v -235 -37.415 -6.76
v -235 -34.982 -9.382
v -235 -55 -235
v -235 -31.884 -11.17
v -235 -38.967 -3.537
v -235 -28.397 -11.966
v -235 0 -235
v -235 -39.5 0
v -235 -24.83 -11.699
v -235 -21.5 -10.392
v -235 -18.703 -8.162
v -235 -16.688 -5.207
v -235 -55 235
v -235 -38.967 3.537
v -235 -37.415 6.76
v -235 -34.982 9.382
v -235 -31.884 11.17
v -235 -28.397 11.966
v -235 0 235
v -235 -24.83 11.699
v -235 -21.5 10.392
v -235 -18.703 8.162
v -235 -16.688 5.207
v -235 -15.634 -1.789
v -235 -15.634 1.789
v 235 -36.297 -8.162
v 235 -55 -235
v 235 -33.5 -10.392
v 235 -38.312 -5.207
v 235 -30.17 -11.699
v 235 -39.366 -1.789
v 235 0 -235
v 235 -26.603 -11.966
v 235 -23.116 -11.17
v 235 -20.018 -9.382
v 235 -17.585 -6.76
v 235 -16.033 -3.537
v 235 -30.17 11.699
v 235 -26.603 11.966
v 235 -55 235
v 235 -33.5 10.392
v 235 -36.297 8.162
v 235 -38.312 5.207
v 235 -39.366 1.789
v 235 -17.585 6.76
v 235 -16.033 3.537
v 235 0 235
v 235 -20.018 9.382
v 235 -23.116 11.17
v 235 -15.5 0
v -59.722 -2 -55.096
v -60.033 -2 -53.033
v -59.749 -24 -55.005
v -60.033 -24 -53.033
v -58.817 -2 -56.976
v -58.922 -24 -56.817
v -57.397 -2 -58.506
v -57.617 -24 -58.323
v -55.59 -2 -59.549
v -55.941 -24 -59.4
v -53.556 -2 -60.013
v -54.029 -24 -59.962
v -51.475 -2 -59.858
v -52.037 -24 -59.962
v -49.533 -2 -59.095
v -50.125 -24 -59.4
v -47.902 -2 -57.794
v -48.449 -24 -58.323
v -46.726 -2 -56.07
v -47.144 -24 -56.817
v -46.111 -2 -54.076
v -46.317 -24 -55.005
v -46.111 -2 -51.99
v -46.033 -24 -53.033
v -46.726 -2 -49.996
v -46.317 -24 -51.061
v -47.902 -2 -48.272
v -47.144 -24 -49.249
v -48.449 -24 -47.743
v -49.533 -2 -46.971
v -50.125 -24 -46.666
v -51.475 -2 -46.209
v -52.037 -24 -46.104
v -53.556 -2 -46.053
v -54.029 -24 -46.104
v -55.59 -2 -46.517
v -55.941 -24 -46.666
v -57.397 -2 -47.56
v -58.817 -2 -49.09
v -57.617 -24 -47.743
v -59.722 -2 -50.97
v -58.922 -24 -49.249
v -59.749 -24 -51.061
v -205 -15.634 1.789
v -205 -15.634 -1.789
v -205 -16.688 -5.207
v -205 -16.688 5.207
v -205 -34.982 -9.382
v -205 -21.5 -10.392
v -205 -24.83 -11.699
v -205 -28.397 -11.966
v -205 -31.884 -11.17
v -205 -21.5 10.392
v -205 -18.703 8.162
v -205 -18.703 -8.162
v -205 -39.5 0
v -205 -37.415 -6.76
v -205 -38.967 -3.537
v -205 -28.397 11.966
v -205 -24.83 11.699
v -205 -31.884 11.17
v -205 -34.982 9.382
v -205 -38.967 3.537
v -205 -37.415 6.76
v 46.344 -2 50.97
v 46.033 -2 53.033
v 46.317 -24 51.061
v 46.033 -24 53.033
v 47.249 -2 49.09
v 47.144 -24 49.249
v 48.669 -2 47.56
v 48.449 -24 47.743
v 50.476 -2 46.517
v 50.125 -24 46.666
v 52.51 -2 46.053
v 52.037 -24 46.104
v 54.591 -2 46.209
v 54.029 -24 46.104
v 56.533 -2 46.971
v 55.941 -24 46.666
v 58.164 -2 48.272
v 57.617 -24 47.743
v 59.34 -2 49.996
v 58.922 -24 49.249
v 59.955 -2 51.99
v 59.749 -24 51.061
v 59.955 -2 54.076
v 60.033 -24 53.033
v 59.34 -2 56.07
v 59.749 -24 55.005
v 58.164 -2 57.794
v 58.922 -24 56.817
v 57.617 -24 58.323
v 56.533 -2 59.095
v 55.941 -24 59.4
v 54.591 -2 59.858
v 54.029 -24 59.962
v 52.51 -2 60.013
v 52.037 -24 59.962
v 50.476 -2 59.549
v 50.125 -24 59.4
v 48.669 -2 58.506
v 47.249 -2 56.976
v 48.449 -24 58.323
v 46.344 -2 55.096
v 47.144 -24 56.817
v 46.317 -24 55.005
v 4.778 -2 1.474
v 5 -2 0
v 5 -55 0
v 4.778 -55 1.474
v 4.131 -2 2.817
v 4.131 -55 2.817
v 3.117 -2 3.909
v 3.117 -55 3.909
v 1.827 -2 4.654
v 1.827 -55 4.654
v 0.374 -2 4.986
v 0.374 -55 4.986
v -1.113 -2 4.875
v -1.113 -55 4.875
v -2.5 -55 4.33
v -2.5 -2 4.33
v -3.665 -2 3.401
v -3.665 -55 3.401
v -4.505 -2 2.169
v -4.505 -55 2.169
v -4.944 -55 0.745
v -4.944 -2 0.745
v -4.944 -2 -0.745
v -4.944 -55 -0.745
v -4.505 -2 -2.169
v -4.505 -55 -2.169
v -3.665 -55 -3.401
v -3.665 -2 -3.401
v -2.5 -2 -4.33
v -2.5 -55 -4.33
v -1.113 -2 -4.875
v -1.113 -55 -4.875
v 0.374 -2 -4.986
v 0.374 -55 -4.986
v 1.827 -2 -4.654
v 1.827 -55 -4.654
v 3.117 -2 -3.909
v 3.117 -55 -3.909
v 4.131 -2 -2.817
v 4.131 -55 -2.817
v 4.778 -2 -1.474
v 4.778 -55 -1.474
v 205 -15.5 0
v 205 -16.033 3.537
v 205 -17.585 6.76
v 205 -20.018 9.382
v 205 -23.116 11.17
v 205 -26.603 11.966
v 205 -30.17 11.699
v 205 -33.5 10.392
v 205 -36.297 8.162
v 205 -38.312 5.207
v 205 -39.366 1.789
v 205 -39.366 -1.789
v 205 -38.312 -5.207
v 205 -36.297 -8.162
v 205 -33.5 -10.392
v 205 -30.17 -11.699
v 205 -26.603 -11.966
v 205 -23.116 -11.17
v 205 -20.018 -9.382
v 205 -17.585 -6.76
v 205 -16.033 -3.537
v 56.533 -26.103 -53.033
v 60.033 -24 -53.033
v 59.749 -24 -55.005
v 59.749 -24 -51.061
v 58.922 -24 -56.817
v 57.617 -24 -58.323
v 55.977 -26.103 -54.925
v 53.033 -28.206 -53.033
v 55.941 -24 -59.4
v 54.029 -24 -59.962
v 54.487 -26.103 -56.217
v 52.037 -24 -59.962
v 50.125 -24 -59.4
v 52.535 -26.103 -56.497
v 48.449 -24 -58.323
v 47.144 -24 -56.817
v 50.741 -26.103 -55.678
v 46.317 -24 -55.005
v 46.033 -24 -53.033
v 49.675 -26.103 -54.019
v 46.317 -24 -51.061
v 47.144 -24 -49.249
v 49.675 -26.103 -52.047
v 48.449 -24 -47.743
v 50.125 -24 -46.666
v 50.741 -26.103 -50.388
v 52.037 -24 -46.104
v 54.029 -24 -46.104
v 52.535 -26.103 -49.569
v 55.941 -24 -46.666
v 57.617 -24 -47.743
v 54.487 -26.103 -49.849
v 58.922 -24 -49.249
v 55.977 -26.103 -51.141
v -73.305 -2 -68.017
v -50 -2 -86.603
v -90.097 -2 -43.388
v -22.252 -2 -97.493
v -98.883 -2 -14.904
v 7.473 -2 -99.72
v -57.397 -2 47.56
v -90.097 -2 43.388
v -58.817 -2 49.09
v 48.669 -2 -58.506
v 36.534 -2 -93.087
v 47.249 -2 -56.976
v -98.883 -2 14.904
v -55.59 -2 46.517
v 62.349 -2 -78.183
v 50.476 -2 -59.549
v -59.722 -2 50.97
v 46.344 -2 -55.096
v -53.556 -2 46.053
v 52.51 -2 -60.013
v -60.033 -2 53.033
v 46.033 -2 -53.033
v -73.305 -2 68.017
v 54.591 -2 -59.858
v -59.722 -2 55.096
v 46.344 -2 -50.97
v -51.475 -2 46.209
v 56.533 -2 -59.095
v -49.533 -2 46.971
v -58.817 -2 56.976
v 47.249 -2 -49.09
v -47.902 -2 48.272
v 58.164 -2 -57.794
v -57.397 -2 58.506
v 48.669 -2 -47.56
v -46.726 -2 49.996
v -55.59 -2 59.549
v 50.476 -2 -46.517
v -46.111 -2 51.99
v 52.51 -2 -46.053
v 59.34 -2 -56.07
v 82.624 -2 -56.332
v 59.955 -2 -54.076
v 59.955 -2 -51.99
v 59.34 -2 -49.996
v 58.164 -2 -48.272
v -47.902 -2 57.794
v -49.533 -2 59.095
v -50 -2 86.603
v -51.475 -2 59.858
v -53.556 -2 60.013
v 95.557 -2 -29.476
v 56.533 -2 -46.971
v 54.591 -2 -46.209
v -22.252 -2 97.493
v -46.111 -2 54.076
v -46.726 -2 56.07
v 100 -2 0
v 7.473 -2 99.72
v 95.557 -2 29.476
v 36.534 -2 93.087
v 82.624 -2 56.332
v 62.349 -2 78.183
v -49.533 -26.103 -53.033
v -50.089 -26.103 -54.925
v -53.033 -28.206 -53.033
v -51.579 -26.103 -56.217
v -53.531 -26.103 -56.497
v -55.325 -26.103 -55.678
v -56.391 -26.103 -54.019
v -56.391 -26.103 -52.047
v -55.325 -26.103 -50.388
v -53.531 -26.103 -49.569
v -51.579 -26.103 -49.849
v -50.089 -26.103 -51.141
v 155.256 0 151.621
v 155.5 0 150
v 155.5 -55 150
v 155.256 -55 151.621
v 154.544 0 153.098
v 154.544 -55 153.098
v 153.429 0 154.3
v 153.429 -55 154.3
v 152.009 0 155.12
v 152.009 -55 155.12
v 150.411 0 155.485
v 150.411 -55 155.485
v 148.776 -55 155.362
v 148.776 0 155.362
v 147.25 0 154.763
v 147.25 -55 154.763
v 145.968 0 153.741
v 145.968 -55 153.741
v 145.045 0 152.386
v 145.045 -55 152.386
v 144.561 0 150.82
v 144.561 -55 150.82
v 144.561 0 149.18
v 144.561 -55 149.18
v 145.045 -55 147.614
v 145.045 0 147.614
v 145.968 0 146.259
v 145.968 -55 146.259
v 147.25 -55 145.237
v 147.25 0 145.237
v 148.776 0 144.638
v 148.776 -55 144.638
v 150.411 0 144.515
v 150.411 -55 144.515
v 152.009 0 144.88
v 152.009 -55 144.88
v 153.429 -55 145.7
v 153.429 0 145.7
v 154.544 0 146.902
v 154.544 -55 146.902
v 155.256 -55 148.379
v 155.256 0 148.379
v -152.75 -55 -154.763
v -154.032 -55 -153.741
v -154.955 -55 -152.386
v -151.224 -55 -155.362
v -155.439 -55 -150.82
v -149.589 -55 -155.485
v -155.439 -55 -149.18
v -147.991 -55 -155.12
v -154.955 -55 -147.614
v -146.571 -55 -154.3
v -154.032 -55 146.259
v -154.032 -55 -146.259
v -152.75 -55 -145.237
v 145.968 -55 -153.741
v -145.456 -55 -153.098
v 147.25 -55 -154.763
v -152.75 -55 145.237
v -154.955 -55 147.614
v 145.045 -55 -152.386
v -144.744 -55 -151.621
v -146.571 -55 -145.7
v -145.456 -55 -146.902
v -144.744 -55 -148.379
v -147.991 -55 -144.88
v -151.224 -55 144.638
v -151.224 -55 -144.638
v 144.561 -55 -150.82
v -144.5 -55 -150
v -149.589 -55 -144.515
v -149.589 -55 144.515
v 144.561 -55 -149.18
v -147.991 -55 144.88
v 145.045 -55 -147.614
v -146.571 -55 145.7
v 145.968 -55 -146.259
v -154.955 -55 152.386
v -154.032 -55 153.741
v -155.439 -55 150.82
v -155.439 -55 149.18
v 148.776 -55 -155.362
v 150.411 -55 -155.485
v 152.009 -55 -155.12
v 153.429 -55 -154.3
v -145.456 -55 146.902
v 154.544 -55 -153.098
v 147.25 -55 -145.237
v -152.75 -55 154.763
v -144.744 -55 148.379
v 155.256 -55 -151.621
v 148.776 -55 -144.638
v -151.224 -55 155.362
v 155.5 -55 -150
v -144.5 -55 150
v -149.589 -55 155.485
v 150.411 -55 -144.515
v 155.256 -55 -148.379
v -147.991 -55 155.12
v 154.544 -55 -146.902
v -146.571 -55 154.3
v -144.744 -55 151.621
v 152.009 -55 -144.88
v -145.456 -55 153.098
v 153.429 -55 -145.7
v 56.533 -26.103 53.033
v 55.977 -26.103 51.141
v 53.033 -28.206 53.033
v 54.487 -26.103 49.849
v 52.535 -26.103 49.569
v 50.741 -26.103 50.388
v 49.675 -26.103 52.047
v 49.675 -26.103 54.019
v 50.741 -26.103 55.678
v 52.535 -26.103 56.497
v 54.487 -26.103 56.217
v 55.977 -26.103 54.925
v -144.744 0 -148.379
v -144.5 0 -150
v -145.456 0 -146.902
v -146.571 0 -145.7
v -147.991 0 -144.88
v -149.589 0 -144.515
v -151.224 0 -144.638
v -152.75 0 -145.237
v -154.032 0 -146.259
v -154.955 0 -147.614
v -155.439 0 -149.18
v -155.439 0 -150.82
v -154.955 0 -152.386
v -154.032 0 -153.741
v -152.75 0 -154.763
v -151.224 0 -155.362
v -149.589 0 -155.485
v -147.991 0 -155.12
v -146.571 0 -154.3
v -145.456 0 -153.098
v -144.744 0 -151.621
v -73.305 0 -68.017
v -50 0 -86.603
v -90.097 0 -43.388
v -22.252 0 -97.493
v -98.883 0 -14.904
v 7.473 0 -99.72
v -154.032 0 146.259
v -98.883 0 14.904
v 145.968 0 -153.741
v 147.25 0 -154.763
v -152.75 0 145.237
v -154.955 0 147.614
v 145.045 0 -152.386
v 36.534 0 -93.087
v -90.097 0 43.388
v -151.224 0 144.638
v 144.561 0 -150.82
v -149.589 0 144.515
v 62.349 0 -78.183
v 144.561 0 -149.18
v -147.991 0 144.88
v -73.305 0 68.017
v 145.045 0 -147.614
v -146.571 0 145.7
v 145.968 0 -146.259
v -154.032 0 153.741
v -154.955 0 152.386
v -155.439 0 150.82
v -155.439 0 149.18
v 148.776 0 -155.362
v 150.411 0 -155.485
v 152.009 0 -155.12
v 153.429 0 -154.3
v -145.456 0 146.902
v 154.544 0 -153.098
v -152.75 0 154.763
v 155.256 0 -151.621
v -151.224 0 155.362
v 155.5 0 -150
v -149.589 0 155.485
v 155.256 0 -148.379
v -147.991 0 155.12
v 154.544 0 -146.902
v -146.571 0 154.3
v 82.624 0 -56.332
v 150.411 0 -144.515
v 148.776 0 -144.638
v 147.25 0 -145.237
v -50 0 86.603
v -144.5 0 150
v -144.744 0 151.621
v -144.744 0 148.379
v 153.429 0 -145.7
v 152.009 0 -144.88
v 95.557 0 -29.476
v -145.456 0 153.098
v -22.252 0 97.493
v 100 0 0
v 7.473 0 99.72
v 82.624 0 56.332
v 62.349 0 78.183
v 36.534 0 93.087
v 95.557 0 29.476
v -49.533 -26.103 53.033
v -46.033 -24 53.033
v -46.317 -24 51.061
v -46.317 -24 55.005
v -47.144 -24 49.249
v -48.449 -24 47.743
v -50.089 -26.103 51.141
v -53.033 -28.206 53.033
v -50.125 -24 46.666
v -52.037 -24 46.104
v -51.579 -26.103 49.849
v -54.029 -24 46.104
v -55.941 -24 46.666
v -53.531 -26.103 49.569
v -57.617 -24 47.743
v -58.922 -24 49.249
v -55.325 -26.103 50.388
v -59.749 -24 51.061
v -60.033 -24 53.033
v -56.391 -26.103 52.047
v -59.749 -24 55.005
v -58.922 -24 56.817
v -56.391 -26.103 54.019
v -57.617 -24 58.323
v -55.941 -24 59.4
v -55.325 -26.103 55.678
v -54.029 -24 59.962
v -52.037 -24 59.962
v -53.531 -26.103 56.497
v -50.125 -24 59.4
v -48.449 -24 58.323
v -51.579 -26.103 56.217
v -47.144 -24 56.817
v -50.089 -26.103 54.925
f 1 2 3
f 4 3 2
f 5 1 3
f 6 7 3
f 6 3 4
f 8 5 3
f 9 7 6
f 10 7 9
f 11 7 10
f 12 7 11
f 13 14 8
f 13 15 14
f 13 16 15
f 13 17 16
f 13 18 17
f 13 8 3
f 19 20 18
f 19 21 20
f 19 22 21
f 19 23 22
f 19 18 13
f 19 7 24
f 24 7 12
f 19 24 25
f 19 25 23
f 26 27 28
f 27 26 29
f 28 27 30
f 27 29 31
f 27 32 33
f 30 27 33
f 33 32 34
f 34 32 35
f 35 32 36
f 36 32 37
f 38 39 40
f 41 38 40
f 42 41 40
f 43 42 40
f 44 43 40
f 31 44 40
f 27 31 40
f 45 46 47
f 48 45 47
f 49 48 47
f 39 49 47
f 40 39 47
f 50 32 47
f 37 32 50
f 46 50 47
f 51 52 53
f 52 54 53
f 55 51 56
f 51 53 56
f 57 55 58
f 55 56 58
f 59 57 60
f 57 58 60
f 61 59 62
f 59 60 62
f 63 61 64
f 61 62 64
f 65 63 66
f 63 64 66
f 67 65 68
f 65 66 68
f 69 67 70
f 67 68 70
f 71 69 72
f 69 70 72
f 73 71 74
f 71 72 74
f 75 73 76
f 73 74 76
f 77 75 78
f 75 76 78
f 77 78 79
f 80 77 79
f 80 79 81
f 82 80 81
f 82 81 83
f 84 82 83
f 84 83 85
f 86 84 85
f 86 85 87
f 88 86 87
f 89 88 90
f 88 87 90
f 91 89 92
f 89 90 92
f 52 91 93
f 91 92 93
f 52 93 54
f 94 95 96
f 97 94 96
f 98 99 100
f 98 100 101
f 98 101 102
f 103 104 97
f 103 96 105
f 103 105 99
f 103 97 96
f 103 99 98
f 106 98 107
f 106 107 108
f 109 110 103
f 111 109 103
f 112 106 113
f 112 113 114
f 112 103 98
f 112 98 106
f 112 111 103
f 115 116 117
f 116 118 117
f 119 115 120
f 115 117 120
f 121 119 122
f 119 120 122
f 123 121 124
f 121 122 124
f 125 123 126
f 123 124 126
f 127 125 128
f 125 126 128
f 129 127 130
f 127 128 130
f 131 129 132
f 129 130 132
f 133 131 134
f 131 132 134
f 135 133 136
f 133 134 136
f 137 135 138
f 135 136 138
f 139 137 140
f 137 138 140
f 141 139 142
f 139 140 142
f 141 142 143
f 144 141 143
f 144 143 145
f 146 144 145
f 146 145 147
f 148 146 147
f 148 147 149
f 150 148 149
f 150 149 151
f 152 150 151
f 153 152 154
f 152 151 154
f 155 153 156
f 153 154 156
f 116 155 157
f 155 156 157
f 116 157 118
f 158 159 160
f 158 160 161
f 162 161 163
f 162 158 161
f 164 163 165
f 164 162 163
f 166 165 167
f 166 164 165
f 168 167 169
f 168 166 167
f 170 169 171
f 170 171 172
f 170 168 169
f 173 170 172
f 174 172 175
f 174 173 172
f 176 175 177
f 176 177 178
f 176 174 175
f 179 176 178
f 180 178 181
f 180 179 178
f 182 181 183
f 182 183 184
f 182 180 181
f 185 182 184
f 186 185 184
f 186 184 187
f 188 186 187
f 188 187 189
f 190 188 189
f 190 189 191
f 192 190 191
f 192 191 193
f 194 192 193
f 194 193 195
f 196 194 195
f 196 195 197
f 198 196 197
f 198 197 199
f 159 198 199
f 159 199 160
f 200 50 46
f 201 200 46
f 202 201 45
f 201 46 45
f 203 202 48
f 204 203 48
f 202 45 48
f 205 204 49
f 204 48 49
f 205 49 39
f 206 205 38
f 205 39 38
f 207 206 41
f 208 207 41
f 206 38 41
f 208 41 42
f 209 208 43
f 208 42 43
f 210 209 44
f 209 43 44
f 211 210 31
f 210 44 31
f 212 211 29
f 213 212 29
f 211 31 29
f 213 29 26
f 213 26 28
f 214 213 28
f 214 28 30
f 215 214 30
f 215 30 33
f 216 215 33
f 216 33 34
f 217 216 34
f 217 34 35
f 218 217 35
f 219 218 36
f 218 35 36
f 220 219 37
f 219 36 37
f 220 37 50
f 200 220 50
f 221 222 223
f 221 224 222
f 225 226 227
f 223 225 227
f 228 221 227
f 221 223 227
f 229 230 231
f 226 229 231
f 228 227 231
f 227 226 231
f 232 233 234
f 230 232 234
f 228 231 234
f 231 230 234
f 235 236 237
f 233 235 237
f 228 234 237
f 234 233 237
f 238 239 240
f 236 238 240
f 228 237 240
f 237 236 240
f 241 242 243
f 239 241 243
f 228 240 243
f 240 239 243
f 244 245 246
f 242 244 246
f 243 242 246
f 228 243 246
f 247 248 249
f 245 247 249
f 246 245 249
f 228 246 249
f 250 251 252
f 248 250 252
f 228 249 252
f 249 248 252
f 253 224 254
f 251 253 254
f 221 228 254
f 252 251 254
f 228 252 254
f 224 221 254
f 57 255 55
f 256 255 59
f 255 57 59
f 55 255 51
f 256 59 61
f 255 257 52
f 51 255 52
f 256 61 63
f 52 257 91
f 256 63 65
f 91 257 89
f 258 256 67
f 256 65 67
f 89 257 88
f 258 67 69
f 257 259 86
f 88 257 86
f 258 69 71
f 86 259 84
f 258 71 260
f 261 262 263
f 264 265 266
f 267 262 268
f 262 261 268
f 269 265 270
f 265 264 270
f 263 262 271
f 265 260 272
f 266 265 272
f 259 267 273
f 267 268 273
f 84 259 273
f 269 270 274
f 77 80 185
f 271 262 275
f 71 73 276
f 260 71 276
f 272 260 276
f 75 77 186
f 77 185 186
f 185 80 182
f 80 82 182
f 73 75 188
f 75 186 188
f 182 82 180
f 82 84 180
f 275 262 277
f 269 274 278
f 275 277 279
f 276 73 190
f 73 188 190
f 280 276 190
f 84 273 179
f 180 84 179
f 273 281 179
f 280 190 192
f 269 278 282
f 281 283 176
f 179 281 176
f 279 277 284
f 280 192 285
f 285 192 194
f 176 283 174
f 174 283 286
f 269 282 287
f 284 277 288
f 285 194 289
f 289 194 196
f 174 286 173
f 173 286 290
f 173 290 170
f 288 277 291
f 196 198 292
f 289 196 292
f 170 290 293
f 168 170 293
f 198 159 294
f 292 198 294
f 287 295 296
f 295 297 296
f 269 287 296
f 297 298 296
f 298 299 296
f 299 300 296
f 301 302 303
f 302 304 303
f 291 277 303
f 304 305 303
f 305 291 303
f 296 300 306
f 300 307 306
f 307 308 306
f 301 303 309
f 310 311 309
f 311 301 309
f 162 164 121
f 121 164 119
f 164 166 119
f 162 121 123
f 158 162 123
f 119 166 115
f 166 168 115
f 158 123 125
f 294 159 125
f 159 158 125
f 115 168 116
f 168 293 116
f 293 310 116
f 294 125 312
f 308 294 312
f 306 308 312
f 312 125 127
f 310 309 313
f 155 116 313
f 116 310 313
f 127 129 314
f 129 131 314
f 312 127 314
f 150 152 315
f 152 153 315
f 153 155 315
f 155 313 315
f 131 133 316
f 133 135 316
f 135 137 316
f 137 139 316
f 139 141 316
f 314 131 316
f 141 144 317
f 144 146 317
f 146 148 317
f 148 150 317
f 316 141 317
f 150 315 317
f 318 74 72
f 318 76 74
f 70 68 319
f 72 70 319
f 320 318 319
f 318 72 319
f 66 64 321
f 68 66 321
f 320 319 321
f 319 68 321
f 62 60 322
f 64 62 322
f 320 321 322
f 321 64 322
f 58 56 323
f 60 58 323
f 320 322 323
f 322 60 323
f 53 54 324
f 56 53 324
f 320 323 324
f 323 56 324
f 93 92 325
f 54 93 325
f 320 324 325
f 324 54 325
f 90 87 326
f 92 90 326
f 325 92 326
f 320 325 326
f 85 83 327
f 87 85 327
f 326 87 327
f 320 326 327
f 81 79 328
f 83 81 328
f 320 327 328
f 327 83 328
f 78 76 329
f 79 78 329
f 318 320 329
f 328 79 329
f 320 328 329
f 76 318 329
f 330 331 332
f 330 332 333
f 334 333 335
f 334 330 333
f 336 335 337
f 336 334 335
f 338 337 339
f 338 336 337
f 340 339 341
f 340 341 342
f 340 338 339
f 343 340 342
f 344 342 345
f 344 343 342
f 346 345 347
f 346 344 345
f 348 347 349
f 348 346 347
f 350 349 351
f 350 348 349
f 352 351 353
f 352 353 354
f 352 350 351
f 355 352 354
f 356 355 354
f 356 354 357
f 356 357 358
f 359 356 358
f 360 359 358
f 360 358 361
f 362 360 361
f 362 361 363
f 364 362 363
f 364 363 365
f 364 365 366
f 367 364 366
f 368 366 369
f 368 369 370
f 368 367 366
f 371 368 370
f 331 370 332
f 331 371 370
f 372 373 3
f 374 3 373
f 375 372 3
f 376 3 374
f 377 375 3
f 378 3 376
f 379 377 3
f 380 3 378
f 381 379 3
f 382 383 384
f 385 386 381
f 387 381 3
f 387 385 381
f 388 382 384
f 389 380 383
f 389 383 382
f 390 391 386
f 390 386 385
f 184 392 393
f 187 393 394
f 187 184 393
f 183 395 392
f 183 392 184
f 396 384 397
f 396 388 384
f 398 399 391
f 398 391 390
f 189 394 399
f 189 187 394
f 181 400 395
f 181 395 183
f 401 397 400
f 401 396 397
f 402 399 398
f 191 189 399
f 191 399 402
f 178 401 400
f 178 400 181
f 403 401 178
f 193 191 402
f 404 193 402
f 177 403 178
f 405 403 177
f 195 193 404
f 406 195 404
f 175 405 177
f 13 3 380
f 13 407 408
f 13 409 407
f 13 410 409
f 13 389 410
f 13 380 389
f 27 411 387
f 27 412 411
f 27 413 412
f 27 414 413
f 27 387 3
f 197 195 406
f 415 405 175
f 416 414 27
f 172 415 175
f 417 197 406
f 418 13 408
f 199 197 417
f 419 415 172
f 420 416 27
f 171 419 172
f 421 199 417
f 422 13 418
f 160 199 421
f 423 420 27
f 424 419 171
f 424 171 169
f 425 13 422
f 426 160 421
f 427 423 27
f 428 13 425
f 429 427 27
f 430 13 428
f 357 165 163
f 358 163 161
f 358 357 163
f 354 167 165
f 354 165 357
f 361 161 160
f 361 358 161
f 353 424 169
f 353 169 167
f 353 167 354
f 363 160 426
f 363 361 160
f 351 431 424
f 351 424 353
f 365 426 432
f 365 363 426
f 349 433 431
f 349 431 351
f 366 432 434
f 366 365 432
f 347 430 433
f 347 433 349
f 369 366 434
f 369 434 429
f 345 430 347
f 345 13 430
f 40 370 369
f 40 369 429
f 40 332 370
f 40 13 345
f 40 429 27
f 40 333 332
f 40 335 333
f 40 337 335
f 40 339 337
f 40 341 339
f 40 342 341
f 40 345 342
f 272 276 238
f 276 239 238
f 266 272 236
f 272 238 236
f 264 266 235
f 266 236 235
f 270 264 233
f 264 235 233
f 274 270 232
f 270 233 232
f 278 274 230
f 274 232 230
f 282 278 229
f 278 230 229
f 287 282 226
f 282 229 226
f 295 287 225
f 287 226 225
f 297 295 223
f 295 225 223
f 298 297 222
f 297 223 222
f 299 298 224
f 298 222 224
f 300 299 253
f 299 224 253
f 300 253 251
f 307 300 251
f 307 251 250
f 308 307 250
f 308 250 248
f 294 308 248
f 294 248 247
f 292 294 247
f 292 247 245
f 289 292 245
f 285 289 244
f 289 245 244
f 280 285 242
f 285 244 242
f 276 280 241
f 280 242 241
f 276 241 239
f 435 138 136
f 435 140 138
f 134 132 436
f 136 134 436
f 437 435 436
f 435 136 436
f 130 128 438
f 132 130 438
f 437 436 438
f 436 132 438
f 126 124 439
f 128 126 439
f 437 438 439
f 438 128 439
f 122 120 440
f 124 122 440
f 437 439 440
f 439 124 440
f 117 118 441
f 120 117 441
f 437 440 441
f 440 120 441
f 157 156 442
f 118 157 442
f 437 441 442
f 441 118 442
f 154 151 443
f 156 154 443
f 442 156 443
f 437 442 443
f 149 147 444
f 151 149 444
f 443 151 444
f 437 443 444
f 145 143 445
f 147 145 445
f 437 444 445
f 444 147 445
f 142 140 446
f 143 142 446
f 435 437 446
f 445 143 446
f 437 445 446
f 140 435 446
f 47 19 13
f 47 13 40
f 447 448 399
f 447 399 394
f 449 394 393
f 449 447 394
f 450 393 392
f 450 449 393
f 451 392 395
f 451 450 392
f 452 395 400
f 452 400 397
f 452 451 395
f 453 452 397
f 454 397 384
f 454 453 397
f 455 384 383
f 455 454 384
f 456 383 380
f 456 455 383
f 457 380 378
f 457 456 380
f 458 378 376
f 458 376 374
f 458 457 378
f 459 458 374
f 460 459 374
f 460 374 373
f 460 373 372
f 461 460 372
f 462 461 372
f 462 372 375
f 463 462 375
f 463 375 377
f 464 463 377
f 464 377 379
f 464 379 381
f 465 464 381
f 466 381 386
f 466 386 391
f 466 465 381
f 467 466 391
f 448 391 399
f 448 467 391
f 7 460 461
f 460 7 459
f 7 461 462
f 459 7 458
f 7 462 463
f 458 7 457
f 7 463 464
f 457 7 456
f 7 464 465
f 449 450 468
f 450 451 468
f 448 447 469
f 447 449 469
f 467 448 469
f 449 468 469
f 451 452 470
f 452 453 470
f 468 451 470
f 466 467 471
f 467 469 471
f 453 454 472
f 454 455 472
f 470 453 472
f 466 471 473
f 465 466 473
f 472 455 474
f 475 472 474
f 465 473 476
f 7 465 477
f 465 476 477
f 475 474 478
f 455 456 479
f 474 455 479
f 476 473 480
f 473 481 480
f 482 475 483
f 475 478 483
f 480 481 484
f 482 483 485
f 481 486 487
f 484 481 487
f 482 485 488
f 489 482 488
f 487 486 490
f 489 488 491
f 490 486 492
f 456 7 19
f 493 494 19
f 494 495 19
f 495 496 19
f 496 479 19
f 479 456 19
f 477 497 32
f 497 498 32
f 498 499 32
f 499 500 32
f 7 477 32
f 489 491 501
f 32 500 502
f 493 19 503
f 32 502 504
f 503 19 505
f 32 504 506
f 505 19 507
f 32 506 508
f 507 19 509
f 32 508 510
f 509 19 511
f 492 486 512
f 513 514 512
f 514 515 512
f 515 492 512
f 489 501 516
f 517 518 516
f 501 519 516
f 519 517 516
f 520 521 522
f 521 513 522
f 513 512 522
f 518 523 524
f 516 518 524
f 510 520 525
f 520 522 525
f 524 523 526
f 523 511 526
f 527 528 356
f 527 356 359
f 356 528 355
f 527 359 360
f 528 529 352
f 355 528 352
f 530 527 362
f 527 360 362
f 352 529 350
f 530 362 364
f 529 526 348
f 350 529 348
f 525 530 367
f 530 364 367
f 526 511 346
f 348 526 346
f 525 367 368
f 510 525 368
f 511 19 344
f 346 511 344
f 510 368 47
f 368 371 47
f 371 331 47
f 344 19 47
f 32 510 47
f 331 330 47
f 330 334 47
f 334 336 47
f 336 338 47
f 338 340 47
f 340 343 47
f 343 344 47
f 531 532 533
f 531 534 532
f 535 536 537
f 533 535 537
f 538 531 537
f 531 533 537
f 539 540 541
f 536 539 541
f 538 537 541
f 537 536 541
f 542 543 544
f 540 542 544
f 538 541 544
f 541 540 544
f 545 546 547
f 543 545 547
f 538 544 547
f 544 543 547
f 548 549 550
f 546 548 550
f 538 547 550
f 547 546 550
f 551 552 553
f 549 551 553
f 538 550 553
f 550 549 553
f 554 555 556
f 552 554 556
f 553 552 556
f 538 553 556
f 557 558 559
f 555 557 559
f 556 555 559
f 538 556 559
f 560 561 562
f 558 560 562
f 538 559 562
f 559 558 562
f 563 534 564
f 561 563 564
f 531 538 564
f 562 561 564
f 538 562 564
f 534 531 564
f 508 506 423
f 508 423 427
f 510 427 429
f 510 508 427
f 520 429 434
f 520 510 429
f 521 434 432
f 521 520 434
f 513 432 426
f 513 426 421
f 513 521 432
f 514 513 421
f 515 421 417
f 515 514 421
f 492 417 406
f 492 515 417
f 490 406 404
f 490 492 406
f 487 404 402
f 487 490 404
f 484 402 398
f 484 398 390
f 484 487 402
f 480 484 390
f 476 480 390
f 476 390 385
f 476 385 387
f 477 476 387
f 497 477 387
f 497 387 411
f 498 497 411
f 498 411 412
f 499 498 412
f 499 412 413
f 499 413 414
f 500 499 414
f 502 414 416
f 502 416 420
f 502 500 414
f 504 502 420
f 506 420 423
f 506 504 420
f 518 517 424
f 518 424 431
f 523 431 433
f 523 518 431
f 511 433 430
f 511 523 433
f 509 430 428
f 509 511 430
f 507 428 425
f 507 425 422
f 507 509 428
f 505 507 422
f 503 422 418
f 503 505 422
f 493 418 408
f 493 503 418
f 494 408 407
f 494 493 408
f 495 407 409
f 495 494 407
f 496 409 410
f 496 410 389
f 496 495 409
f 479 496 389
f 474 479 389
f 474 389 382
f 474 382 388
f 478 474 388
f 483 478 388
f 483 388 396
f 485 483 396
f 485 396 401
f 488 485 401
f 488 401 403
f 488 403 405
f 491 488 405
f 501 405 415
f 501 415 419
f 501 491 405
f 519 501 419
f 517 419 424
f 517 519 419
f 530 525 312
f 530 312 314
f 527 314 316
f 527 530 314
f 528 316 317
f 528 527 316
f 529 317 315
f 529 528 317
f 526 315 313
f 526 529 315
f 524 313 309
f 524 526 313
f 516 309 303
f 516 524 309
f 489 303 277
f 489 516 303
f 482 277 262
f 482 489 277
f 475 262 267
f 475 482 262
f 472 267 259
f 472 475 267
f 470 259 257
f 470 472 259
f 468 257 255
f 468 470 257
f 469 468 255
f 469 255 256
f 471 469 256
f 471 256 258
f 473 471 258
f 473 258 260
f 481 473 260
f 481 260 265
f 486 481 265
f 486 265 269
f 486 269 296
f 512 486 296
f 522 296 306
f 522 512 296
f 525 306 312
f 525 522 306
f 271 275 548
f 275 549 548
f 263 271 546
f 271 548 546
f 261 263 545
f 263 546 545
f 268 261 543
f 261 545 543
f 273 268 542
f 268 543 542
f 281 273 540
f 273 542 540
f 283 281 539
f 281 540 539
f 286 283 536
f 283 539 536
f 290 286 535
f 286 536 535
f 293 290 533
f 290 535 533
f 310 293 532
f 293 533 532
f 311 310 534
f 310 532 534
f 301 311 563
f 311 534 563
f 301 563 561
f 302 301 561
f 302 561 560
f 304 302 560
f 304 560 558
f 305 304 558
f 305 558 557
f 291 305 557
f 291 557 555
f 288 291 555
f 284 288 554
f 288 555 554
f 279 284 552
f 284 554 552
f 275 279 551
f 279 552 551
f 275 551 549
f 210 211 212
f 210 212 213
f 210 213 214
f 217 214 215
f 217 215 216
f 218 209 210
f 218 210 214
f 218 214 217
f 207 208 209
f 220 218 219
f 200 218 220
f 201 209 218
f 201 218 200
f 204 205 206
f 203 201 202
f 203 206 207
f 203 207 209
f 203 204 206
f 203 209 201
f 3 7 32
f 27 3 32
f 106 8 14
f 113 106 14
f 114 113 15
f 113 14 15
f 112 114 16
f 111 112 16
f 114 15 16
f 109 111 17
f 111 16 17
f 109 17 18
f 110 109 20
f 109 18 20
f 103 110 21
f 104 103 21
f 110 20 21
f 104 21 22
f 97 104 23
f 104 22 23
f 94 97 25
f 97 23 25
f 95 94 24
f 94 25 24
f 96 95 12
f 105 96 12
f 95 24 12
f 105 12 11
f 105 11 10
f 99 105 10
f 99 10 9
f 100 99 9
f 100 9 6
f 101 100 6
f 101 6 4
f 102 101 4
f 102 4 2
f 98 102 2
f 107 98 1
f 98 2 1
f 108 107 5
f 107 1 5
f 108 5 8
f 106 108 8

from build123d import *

# Parameters (mm, degrees)
F0_W     = 470
F0_H     = 470
F0_R     = 5.5
F0_R_2   = 5
F1_DEPTH = 55
F2_D     = 14
F2_DEPTH = 24
F2_TIP   = 4.2060243332
F3_R     = 100
F3_R_2   = 5
F4_DEPTH = 2
F5_R     = 12
F6_DEPTH = 30
F7_R     = 12
F8_DEPTH = 30


with BuildPart() as f1:
    # F0 (on Front) → F1 (new body)
    with BuildSketch(Plane.XZ):
        Rectangle(F0_W, F0_H)
        with Locations((-150, -150)):
            Circle(F0_R, mode=Mode.SUBTRACT)
        with Locations((150, -150)):
            Circle(F0_R, mode=Mode.SUBTRACT)
        with Locations((-150, 150)):
            Circle(F0_R, mode=Mode.SUBTRACT)
        Circle(F0_R_2, mode=Mode.SUBTRACT)
        with Locations((150, 150)):
            Circle(F0_R, mode=Mode.SUBTRACT)
    extrude(amount=F1_DEPTH)

    # F2
    with Locations(Plane(origin=(0, 0, 0), x_dir=(1, 0, 0), z_dir=(0, 1, 0))):
        with Locations((53.033008589, -53.033008589), (-53.033008589, -53.033008589), (-53.033008589, 53.033008589), (53.033008589, 53.033008589)):
            Hole(F2_D / 2, depth=F2_DEPTH)
            with Locations((0, 0, -(F2_DEPTH + F2_TIP / 2))):  # 118° drill point
                Cone(0, F2_D / 2, F2_TIP, mode=Mode.SUBTRACT)

    # F3 (on face) → F4 (cut)
    with BuildSketch(Plane.XZ):
        Circle(F3_R)
        Circle(F3_R_2, mode=Mode.SUBTRACT)
    extrude(amount=F4_DEPTH, mode=Mode.SUBTRACT)

    # F5 (on face) → F6 (cut)
    with BuildSketch(Plane.YZ.offset(235)):
        with Locations((-27.5, 0)):
            Circle(F5_R)
    extrude(amount=-F6_DEPTH, mode=Mode.SUBTRACT)

    # F7 (on face) → F8 (cut)
    with BuildSketch(Plane(origin=(-235, 0, 0), x_dir=(0, -1, 0), z_dir=(-1, 0, 0))):
        with Locations((27.5, 0)):
            Circle(F7_R)
    extrude(amount=-F8_DEPTH, mode=Mode.SUBTRACT)


solid = f1.part
